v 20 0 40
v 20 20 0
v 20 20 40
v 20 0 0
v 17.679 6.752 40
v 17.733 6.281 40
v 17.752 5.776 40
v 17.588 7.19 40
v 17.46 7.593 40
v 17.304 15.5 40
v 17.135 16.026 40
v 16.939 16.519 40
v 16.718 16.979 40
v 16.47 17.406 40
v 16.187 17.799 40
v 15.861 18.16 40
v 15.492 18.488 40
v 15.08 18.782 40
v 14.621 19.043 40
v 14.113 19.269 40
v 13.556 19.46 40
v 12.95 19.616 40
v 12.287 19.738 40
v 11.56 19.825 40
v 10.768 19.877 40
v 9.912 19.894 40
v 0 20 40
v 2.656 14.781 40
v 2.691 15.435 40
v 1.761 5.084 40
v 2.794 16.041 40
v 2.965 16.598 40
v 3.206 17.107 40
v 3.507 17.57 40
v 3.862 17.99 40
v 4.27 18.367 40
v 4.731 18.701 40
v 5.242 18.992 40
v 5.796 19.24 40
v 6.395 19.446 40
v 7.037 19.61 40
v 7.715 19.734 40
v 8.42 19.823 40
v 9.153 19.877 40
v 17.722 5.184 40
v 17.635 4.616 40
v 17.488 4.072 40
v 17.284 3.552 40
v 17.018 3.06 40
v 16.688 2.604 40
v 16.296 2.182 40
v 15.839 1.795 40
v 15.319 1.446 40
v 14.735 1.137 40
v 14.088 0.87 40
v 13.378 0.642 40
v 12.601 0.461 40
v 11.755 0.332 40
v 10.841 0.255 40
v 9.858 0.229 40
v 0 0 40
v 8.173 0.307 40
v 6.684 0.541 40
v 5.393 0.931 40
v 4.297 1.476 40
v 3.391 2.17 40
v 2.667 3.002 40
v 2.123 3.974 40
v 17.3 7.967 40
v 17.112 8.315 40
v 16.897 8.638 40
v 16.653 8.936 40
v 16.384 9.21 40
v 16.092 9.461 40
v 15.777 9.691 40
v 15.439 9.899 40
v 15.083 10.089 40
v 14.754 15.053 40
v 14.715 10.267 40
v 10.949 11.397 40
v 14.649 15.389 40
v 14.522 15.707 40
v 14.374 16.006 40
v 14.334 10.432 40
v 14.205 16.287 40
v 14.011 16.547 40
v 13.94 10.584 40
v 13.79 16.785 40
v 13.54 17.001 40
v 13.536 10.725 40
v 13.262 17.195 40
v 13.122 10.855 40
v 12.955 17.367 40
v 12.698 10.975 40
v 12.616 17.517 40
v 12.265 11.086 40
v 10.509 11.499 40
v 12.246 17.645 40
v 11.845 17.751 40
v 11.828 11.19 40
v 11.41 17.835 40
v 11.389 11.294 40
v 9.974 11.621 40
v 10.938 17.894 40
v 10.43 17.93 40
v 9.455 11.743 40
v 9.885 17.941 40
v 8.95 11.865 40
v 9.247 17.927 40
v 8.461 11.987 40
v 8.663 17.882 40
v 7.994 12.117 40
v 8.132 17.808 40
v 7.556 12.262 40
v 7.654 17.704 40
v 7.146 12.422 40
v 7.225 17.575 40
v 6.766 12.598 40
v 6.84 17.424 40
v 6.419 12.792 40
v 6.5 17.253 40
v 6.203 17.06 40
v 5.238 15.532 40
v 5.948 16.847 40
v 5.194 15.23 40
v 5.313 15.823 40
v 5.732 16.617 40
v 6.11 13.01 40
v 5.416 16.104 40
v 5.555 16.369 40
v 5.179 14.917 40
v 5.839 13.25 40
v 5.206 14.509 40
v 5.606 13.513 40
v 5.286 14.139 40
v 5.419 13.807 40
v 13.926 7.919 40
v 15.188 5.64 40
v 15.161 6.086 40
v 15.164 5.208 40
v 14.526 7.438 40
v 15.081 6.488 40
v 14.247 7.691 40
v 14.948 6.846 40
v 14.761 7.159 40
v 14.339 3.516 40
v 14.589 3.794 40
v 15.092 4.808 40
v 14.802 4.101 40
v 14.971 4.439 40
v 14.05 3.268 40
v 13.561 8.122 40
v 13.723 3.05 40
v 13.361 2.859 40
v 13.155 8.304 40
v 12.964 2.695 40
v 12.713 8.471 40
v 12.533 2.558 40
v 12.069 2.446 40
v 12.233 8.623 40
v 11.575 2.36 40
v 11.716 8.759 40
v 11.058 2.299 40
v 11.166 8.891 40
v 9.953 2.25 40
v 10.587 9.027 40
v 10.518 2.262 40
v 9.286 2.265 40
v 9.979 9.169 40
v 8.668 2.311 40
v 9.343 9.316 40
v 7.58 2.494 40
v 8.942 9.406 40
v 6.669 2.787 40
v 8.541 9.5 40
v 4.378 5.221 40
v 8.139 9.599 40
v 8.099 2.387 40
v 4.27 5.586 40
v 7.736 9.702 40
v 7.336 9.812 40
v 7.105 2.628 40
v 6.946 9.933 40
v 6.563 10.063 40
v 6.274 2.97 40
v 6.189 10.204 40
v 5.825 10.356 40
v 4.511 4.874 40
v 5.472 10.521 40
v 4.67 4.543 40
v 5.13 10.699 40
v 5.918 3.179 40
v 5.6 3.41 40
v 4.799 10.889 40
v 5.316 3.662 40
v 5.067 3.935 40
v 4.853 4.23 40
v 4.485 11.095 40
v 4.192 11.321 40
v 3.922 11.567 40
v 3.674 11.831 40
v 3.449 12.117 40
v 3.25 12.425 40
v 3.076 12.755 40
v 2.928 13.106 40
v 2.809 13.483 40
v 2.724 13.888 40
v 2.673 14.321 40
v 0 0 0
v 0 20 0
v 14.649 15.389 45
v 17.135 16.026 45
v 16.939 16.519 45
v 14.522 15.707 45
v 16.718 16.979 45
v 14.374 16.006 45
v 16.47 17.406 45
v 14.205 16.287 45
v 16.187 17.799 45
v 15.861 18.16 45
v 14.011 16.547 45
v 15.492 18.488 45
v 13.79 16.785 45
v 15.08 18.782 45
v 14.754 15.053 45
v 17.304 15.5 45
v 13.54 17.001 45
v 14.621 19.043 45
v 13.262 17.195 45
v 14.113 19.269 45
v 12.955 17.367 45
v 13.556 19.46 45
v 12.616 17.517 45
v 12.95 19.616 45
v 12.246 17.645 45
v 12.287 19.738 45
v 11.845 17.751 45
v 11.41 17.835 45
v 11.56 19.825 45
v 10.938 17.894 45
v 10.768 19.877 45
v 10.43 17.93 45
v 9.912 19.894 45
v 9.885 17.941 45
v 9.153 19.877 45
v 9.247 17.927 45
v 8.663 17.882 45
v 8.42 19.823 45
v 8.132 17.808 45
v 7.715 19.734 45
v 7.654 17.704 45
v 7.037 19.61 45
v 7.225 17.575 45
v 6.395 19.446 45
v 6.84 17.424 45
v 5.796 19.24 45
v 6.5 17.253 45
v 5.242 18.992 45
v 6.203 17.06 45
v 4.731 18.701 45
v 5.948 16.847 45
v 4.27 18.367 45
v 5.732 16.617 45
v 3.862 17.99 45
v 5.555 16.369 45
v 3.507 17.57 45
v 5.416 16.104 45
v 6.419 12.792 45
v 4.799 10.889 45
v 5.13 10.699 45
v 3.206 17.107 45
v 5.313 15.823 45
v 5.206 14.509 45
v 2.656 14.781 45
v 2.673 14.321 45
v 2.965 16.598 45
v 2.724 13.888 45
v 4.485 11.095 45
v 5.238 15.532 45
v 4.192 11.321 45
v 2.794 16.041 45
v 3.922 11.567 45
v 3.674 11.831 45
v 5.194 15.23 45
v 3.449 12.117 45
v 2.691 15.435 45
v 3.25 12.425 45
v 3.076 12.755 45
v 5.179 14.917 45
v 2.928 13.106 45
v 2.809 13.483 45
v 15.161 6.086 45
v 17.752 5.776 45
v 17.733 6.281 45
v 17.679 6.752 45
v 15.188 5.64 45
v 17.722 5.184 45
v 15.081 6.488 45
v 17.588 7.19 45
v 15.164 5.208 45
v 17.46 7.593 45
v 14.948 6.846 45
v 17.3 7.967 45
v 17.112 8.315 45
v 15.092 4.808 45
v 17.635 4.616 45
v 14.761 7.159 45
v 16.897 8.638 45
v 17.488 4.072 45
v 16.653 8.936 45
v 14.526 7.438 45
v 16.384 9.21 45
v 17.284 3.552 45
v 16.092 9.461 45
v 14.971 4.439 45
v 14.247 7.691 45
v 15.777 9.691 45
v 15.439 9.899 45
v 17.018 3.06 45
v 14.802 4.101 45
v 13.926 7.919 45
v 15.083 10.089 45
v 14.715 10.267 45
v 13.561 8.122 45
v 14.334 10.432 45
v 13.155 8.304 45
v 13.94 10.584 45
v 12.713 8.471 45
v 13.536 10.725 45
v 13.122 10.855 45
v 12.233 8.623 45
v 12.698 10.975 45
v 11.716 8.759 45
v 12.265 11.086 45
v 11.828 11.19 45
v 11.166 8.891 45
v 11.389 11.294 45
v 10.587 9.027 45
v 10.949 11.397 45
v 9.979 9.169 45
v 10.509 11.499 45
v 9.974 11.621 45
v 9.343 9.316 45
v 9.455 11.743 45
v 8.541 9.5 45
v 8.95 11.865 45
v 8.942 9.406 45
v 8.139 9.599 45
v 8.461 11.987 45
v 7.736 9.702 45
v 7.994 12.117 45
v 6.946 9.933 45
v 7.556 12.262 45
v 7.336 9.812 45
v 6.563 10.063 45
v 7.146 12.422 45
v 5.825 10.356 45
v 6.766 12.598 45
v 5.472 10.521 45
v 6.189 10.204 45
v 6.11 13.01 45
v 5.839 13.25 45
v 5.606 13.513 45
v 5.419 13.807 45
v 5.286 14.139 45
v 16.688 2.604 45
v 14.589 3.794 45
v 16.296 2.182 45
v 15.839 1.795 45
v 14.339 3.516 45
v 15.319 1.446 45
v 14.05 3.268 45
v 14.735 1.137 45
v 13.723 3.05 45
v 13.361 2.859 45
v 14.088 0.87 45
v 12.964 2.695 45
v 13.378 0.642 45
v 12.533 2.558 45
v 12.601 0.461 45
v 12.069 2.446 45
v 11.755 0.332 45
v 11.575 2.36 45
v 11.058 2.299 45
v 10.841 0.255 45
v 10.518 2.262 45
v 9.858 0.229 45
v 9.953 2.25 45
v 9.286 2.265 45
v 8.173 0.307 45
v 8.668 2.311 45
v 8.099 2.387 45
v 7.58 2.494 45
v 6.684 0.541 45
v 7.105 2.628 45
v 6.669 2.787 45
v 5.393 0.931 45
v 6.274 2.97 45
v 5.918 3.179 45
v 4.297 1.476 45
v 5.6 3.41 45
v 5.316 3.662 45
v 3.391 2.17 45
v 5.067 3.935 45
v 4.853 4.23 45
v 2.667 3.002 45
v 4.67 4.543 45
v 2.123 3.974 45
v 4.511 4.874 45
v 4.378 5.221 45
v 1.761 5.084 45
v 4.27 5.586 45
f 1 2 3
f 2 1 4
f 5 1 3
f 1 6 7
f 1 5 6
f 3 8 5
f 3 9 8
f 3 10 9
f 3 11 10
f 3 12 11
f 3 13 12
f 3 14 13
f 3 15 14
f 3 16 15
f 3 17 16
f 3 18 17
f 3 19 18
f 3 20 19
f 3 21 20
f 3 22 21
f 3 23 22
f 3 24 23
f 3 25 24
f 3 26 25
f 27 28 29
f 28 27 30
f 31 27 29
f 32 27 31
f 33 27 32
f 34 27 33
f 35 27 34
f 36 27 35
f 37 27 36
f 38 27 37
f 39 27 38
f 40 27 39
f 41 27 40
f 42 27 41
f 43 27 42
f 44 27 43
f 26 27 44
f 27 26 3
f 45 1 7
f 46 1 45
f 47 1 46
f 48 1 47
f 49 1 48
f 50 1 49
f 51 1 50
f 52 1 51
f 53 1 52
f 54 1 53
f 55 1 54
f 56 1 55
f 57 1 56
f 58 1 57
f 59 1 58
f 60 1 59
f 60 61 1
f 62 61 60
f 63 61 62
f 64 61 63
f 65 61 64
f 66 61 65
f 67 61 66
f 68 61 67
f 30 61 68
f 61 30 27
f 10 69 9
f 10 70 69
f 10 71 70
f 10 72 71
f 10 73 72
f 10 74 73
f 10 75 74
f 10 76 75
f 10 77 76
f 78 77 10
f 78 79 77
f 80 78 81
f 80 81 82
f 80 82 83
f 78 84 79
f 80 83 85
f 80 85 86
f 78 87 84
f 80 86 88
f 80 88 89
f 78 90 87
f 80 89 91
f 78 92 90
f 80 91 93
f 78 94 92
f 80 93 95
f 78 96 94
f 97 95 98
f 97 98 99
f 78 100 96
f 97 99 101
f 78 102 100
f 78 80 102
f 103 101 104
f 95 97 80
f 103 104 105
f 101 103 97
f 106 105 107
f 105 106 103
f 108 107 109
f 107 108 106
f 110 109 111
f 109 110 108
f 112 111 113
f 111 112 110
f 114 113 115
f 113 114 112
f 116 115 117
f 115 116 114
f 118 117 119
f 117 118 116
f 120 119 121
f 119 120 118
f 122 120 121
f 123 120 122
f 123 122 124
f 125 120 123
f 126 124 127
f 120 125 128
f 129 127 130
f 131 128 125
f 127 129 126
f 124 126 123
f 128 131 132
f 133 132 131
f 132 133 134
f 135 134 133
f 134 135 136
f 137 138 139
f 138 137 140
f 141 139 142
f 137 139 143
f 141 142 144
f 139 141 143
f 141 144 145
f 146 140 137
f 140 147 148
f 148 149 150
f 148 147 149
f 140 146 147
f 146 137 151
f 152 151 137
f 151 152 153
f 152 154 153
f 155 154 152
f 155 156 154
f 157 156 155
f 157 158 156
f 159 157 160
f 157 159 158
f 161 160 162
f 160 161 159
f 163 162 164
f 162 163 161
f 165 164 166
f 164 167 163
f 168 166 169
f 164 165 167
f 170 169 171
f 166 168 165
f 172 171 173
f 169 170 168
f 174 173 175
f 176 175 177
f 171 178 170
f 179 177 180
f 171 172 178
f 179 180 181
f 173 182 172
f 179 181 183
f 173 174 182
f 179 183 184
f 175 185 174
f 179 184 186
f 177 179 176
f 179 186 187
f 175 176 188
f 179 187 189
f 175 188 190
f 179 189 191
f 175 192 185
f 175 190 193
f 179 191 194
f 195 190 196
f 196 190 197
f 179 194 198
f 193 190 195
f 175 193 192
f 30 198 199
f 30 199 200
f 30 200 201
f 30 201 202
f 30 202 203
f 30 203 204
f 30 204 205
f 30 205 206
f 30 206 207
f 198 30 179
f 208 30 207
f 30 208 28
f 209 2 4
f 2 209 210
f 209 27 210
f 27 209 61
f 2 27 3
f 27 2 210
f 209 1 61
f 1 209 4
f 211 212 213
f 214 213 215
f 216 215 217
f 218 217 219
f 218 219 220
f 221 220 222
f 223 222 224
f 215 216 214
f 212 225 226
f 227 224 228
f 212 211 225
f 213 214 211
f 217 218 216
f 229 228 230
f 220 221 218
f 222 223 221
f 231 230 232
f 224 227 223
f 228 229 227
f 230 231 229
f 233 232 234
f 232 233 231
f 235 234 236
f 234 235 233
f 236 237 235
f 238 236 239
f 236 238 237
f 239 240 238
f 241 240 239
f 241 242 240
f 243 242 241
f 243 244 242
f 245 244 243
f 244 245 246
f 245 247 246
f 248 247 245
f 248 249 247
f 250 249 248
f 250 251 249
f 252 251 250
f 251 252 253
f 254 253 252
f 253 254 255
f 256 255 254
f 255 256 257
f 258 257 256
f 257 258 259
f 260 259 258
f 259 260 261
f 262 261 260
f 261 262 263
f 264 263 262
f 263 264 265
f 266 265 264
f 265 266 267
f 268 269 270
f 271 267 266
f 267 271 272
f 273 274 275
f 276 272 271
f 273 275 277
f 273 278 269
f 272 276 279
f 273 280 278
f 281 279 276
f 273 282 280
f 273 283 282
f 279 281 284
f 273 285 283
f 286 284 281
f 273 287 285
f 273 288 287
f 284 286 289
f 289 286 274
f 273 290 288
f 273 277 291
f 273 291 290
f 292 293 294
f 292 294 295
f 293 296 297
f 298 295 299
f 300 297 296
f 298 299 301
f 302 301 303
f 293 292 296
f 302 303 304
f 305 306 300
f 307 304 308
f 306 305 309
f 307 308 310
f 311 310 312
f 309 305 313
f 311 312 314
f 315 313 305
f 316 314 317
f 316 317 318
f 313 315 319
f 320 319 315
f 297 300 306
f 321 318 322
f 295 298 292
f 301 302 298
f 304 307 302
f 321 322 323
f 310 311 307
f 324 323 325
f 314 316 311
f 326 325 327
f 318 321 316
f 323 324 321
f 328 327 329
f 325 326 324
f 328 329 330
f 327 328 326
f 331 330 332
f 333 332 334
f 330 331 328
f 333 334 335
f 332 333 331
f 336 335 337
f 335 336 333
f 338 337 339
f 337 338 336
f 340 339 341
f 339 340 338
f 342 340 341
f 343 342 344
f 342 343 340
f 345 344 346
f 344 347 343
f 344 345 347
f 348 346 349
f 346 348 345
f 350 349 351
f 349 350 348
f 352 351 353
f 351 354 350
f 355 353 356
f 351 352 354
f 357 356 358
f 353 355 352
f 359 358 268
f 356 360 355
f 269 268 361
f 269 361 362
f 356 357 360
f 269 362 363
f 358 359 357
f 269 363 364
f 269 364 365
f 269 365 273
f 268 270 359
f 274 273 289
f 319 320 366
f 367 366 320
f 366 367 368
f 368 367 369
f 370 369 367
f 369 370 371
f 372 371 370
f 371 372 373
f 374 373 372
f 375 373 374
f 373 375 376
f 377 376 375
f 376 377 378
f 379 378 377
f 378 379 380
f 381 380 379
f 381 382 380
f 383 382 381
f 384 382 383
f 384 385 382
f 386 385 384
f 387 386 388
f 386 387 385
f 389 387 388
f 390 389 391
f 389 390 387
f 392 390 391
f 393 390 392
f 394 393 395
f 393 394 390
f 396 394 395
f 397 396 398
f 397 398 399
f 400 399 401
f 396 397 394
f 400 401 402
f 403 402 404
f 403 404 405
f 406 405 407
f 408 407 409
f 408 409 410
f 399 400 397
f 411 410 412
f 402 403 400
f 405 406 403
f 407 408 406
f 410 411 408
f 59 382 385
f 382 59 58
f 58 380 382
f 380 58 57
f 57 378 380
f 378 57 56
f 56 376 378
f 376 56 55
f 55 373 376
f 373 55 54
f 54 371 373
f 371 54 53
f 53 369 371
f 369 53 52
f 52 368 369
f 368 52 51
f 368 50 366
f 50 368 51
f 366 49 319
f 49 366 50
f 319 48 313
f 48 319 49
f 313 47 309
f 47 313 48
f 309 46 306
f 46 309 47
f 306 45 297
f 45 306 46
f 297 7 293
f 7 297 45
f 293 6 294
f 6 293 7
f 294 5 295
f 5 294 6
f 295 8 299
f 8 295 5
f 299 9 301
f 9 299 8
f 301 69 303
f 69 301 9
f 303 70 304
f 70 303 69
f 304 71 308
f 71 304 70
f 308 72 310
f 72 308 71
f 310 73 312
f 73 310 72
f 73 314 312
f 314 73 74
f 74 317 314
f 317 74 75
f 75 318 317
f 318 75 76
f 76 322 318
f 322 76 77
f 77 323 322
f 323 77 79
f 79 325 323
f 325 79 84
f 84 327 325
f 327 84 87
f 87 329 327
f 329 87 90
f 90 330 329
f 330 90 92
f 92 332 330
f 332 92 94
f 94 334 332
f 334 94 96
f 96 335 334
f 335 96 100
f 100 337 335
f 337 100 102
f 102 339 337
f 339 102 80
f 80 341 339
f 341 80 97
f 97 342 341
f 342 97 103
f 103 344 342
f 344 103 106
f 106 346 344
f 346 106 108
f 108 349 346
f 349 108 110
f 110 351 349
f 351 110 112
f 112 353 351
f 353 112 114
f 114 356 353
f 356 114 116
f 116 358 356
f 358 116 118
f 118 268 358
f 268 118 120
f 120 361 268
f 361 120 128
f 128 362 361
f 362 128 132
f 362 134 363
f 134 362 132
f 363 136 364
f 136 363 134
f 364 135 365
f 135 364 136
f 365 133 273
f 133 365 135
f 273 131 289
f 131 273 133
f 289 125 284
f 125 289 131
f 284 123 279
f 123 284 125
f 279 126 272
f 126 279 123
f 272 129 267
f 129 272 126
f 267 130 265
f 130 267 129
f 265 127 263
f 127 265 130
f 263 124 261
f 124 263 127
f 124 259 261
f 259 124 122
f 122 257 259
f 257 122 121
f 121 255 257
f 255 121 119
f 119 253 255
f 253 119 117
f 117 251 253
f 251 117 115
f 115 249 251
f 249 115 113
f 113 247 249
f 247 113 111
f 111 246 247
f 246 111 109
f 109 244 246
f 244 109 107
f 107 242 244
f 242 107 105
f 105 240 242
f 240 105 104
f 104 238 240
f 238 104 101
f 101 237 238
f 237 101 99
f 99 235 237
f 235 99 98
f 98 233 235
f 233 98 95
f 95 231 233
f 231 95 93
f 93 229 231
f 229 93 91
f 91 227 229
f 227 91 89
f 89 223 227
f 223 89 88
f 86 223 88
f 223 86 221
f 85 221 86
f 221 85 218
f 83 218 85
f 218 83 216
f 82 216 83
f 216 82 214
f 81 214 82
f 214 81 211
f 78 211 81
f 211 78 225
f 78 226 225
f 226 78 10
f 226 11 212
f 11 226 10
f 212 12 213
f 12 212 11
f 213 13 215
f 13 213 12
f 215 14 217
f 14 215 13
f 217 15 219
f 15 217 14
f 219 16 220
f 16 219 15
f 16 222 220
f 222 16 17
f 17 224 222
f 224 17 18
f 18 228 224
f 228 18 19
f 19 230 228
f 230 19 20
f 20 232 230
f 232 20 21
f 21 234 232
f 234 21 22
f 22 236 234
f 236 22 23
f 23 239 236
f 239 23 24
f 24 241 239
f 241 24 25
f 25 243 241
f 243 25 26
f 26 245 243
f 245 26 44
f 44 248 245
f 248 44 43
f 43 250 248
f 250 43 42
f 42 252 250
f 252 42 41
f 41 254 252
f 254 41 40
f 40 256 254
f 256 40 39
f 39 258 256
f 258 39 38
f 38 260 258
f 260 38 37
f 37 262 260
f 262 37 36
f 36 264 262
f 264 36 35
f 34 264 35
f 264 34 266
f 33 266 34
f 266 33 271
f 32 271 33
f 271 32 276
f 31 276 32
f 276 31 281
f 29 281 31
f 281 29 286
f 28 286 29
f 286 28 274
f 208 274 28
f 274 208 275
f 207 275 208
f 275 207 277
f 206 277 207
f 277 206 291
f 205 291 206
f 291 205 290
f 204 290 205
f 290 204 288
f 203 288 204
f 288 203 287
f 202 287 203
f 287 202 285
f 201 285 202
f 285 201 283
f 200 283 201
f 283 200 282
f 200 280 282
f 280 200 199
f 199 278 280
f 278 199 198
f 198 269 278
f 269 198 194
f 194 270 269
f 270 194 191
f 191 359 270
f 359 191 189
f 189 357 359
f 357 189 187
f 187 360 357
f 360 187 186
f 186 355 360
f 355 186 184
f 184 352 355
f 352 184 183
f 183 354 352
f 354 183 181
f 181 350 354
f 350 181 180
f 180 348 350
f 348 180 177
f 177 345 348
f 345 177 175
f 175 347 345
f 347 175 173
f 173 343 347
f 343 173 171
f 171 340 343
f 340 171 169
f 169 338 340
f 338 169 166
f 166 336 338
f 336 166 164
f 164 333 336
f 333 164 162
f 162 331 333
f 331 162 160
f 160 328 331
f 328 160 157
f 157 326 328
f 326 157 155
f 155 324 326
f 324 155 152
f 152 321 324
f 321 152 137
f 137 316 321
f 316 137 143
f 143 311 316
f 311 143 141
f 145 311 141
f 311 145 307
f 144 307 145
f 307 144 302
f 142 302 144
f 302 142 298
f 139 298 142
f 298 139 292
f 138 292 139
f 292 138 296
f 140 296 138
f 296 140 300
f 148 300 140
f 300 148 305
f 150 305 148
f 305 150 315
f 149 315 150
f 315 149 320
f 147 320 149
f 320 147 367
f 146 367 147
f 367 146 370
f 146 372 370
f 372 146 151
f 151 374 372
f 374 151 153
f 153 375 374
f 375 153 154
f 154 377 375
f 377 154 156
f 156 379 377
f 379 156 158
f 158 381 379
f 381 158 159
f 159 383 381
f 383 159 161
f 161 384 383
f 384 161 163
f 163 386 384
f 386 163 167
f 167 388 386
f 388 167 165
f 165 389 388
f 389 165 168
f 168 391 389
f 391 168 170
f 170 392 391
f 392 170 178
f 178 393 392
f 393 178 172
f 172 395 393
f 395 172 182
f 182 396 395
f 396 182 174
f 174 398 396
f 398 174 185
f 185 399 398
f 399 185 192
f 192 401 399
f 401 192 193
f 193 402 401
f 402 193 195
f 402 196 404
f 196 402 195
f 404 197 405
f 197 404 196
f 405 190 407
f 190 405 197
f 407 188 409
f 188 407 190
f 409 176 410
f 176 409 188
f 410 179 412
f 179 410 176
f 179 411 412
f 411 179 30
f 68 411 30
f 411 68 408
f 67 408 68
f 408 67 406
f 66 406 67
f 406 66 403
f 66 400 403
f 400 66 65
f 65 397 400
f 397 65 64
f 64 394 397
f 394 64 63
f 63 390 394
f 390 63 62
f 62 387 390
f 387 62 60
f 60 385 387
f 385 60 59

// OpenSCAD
cube([20, 20, 40]);
translate([0.5, 0.5, 40]){
    linear_extrude(5){
        text("S", size=20);
    }
}
